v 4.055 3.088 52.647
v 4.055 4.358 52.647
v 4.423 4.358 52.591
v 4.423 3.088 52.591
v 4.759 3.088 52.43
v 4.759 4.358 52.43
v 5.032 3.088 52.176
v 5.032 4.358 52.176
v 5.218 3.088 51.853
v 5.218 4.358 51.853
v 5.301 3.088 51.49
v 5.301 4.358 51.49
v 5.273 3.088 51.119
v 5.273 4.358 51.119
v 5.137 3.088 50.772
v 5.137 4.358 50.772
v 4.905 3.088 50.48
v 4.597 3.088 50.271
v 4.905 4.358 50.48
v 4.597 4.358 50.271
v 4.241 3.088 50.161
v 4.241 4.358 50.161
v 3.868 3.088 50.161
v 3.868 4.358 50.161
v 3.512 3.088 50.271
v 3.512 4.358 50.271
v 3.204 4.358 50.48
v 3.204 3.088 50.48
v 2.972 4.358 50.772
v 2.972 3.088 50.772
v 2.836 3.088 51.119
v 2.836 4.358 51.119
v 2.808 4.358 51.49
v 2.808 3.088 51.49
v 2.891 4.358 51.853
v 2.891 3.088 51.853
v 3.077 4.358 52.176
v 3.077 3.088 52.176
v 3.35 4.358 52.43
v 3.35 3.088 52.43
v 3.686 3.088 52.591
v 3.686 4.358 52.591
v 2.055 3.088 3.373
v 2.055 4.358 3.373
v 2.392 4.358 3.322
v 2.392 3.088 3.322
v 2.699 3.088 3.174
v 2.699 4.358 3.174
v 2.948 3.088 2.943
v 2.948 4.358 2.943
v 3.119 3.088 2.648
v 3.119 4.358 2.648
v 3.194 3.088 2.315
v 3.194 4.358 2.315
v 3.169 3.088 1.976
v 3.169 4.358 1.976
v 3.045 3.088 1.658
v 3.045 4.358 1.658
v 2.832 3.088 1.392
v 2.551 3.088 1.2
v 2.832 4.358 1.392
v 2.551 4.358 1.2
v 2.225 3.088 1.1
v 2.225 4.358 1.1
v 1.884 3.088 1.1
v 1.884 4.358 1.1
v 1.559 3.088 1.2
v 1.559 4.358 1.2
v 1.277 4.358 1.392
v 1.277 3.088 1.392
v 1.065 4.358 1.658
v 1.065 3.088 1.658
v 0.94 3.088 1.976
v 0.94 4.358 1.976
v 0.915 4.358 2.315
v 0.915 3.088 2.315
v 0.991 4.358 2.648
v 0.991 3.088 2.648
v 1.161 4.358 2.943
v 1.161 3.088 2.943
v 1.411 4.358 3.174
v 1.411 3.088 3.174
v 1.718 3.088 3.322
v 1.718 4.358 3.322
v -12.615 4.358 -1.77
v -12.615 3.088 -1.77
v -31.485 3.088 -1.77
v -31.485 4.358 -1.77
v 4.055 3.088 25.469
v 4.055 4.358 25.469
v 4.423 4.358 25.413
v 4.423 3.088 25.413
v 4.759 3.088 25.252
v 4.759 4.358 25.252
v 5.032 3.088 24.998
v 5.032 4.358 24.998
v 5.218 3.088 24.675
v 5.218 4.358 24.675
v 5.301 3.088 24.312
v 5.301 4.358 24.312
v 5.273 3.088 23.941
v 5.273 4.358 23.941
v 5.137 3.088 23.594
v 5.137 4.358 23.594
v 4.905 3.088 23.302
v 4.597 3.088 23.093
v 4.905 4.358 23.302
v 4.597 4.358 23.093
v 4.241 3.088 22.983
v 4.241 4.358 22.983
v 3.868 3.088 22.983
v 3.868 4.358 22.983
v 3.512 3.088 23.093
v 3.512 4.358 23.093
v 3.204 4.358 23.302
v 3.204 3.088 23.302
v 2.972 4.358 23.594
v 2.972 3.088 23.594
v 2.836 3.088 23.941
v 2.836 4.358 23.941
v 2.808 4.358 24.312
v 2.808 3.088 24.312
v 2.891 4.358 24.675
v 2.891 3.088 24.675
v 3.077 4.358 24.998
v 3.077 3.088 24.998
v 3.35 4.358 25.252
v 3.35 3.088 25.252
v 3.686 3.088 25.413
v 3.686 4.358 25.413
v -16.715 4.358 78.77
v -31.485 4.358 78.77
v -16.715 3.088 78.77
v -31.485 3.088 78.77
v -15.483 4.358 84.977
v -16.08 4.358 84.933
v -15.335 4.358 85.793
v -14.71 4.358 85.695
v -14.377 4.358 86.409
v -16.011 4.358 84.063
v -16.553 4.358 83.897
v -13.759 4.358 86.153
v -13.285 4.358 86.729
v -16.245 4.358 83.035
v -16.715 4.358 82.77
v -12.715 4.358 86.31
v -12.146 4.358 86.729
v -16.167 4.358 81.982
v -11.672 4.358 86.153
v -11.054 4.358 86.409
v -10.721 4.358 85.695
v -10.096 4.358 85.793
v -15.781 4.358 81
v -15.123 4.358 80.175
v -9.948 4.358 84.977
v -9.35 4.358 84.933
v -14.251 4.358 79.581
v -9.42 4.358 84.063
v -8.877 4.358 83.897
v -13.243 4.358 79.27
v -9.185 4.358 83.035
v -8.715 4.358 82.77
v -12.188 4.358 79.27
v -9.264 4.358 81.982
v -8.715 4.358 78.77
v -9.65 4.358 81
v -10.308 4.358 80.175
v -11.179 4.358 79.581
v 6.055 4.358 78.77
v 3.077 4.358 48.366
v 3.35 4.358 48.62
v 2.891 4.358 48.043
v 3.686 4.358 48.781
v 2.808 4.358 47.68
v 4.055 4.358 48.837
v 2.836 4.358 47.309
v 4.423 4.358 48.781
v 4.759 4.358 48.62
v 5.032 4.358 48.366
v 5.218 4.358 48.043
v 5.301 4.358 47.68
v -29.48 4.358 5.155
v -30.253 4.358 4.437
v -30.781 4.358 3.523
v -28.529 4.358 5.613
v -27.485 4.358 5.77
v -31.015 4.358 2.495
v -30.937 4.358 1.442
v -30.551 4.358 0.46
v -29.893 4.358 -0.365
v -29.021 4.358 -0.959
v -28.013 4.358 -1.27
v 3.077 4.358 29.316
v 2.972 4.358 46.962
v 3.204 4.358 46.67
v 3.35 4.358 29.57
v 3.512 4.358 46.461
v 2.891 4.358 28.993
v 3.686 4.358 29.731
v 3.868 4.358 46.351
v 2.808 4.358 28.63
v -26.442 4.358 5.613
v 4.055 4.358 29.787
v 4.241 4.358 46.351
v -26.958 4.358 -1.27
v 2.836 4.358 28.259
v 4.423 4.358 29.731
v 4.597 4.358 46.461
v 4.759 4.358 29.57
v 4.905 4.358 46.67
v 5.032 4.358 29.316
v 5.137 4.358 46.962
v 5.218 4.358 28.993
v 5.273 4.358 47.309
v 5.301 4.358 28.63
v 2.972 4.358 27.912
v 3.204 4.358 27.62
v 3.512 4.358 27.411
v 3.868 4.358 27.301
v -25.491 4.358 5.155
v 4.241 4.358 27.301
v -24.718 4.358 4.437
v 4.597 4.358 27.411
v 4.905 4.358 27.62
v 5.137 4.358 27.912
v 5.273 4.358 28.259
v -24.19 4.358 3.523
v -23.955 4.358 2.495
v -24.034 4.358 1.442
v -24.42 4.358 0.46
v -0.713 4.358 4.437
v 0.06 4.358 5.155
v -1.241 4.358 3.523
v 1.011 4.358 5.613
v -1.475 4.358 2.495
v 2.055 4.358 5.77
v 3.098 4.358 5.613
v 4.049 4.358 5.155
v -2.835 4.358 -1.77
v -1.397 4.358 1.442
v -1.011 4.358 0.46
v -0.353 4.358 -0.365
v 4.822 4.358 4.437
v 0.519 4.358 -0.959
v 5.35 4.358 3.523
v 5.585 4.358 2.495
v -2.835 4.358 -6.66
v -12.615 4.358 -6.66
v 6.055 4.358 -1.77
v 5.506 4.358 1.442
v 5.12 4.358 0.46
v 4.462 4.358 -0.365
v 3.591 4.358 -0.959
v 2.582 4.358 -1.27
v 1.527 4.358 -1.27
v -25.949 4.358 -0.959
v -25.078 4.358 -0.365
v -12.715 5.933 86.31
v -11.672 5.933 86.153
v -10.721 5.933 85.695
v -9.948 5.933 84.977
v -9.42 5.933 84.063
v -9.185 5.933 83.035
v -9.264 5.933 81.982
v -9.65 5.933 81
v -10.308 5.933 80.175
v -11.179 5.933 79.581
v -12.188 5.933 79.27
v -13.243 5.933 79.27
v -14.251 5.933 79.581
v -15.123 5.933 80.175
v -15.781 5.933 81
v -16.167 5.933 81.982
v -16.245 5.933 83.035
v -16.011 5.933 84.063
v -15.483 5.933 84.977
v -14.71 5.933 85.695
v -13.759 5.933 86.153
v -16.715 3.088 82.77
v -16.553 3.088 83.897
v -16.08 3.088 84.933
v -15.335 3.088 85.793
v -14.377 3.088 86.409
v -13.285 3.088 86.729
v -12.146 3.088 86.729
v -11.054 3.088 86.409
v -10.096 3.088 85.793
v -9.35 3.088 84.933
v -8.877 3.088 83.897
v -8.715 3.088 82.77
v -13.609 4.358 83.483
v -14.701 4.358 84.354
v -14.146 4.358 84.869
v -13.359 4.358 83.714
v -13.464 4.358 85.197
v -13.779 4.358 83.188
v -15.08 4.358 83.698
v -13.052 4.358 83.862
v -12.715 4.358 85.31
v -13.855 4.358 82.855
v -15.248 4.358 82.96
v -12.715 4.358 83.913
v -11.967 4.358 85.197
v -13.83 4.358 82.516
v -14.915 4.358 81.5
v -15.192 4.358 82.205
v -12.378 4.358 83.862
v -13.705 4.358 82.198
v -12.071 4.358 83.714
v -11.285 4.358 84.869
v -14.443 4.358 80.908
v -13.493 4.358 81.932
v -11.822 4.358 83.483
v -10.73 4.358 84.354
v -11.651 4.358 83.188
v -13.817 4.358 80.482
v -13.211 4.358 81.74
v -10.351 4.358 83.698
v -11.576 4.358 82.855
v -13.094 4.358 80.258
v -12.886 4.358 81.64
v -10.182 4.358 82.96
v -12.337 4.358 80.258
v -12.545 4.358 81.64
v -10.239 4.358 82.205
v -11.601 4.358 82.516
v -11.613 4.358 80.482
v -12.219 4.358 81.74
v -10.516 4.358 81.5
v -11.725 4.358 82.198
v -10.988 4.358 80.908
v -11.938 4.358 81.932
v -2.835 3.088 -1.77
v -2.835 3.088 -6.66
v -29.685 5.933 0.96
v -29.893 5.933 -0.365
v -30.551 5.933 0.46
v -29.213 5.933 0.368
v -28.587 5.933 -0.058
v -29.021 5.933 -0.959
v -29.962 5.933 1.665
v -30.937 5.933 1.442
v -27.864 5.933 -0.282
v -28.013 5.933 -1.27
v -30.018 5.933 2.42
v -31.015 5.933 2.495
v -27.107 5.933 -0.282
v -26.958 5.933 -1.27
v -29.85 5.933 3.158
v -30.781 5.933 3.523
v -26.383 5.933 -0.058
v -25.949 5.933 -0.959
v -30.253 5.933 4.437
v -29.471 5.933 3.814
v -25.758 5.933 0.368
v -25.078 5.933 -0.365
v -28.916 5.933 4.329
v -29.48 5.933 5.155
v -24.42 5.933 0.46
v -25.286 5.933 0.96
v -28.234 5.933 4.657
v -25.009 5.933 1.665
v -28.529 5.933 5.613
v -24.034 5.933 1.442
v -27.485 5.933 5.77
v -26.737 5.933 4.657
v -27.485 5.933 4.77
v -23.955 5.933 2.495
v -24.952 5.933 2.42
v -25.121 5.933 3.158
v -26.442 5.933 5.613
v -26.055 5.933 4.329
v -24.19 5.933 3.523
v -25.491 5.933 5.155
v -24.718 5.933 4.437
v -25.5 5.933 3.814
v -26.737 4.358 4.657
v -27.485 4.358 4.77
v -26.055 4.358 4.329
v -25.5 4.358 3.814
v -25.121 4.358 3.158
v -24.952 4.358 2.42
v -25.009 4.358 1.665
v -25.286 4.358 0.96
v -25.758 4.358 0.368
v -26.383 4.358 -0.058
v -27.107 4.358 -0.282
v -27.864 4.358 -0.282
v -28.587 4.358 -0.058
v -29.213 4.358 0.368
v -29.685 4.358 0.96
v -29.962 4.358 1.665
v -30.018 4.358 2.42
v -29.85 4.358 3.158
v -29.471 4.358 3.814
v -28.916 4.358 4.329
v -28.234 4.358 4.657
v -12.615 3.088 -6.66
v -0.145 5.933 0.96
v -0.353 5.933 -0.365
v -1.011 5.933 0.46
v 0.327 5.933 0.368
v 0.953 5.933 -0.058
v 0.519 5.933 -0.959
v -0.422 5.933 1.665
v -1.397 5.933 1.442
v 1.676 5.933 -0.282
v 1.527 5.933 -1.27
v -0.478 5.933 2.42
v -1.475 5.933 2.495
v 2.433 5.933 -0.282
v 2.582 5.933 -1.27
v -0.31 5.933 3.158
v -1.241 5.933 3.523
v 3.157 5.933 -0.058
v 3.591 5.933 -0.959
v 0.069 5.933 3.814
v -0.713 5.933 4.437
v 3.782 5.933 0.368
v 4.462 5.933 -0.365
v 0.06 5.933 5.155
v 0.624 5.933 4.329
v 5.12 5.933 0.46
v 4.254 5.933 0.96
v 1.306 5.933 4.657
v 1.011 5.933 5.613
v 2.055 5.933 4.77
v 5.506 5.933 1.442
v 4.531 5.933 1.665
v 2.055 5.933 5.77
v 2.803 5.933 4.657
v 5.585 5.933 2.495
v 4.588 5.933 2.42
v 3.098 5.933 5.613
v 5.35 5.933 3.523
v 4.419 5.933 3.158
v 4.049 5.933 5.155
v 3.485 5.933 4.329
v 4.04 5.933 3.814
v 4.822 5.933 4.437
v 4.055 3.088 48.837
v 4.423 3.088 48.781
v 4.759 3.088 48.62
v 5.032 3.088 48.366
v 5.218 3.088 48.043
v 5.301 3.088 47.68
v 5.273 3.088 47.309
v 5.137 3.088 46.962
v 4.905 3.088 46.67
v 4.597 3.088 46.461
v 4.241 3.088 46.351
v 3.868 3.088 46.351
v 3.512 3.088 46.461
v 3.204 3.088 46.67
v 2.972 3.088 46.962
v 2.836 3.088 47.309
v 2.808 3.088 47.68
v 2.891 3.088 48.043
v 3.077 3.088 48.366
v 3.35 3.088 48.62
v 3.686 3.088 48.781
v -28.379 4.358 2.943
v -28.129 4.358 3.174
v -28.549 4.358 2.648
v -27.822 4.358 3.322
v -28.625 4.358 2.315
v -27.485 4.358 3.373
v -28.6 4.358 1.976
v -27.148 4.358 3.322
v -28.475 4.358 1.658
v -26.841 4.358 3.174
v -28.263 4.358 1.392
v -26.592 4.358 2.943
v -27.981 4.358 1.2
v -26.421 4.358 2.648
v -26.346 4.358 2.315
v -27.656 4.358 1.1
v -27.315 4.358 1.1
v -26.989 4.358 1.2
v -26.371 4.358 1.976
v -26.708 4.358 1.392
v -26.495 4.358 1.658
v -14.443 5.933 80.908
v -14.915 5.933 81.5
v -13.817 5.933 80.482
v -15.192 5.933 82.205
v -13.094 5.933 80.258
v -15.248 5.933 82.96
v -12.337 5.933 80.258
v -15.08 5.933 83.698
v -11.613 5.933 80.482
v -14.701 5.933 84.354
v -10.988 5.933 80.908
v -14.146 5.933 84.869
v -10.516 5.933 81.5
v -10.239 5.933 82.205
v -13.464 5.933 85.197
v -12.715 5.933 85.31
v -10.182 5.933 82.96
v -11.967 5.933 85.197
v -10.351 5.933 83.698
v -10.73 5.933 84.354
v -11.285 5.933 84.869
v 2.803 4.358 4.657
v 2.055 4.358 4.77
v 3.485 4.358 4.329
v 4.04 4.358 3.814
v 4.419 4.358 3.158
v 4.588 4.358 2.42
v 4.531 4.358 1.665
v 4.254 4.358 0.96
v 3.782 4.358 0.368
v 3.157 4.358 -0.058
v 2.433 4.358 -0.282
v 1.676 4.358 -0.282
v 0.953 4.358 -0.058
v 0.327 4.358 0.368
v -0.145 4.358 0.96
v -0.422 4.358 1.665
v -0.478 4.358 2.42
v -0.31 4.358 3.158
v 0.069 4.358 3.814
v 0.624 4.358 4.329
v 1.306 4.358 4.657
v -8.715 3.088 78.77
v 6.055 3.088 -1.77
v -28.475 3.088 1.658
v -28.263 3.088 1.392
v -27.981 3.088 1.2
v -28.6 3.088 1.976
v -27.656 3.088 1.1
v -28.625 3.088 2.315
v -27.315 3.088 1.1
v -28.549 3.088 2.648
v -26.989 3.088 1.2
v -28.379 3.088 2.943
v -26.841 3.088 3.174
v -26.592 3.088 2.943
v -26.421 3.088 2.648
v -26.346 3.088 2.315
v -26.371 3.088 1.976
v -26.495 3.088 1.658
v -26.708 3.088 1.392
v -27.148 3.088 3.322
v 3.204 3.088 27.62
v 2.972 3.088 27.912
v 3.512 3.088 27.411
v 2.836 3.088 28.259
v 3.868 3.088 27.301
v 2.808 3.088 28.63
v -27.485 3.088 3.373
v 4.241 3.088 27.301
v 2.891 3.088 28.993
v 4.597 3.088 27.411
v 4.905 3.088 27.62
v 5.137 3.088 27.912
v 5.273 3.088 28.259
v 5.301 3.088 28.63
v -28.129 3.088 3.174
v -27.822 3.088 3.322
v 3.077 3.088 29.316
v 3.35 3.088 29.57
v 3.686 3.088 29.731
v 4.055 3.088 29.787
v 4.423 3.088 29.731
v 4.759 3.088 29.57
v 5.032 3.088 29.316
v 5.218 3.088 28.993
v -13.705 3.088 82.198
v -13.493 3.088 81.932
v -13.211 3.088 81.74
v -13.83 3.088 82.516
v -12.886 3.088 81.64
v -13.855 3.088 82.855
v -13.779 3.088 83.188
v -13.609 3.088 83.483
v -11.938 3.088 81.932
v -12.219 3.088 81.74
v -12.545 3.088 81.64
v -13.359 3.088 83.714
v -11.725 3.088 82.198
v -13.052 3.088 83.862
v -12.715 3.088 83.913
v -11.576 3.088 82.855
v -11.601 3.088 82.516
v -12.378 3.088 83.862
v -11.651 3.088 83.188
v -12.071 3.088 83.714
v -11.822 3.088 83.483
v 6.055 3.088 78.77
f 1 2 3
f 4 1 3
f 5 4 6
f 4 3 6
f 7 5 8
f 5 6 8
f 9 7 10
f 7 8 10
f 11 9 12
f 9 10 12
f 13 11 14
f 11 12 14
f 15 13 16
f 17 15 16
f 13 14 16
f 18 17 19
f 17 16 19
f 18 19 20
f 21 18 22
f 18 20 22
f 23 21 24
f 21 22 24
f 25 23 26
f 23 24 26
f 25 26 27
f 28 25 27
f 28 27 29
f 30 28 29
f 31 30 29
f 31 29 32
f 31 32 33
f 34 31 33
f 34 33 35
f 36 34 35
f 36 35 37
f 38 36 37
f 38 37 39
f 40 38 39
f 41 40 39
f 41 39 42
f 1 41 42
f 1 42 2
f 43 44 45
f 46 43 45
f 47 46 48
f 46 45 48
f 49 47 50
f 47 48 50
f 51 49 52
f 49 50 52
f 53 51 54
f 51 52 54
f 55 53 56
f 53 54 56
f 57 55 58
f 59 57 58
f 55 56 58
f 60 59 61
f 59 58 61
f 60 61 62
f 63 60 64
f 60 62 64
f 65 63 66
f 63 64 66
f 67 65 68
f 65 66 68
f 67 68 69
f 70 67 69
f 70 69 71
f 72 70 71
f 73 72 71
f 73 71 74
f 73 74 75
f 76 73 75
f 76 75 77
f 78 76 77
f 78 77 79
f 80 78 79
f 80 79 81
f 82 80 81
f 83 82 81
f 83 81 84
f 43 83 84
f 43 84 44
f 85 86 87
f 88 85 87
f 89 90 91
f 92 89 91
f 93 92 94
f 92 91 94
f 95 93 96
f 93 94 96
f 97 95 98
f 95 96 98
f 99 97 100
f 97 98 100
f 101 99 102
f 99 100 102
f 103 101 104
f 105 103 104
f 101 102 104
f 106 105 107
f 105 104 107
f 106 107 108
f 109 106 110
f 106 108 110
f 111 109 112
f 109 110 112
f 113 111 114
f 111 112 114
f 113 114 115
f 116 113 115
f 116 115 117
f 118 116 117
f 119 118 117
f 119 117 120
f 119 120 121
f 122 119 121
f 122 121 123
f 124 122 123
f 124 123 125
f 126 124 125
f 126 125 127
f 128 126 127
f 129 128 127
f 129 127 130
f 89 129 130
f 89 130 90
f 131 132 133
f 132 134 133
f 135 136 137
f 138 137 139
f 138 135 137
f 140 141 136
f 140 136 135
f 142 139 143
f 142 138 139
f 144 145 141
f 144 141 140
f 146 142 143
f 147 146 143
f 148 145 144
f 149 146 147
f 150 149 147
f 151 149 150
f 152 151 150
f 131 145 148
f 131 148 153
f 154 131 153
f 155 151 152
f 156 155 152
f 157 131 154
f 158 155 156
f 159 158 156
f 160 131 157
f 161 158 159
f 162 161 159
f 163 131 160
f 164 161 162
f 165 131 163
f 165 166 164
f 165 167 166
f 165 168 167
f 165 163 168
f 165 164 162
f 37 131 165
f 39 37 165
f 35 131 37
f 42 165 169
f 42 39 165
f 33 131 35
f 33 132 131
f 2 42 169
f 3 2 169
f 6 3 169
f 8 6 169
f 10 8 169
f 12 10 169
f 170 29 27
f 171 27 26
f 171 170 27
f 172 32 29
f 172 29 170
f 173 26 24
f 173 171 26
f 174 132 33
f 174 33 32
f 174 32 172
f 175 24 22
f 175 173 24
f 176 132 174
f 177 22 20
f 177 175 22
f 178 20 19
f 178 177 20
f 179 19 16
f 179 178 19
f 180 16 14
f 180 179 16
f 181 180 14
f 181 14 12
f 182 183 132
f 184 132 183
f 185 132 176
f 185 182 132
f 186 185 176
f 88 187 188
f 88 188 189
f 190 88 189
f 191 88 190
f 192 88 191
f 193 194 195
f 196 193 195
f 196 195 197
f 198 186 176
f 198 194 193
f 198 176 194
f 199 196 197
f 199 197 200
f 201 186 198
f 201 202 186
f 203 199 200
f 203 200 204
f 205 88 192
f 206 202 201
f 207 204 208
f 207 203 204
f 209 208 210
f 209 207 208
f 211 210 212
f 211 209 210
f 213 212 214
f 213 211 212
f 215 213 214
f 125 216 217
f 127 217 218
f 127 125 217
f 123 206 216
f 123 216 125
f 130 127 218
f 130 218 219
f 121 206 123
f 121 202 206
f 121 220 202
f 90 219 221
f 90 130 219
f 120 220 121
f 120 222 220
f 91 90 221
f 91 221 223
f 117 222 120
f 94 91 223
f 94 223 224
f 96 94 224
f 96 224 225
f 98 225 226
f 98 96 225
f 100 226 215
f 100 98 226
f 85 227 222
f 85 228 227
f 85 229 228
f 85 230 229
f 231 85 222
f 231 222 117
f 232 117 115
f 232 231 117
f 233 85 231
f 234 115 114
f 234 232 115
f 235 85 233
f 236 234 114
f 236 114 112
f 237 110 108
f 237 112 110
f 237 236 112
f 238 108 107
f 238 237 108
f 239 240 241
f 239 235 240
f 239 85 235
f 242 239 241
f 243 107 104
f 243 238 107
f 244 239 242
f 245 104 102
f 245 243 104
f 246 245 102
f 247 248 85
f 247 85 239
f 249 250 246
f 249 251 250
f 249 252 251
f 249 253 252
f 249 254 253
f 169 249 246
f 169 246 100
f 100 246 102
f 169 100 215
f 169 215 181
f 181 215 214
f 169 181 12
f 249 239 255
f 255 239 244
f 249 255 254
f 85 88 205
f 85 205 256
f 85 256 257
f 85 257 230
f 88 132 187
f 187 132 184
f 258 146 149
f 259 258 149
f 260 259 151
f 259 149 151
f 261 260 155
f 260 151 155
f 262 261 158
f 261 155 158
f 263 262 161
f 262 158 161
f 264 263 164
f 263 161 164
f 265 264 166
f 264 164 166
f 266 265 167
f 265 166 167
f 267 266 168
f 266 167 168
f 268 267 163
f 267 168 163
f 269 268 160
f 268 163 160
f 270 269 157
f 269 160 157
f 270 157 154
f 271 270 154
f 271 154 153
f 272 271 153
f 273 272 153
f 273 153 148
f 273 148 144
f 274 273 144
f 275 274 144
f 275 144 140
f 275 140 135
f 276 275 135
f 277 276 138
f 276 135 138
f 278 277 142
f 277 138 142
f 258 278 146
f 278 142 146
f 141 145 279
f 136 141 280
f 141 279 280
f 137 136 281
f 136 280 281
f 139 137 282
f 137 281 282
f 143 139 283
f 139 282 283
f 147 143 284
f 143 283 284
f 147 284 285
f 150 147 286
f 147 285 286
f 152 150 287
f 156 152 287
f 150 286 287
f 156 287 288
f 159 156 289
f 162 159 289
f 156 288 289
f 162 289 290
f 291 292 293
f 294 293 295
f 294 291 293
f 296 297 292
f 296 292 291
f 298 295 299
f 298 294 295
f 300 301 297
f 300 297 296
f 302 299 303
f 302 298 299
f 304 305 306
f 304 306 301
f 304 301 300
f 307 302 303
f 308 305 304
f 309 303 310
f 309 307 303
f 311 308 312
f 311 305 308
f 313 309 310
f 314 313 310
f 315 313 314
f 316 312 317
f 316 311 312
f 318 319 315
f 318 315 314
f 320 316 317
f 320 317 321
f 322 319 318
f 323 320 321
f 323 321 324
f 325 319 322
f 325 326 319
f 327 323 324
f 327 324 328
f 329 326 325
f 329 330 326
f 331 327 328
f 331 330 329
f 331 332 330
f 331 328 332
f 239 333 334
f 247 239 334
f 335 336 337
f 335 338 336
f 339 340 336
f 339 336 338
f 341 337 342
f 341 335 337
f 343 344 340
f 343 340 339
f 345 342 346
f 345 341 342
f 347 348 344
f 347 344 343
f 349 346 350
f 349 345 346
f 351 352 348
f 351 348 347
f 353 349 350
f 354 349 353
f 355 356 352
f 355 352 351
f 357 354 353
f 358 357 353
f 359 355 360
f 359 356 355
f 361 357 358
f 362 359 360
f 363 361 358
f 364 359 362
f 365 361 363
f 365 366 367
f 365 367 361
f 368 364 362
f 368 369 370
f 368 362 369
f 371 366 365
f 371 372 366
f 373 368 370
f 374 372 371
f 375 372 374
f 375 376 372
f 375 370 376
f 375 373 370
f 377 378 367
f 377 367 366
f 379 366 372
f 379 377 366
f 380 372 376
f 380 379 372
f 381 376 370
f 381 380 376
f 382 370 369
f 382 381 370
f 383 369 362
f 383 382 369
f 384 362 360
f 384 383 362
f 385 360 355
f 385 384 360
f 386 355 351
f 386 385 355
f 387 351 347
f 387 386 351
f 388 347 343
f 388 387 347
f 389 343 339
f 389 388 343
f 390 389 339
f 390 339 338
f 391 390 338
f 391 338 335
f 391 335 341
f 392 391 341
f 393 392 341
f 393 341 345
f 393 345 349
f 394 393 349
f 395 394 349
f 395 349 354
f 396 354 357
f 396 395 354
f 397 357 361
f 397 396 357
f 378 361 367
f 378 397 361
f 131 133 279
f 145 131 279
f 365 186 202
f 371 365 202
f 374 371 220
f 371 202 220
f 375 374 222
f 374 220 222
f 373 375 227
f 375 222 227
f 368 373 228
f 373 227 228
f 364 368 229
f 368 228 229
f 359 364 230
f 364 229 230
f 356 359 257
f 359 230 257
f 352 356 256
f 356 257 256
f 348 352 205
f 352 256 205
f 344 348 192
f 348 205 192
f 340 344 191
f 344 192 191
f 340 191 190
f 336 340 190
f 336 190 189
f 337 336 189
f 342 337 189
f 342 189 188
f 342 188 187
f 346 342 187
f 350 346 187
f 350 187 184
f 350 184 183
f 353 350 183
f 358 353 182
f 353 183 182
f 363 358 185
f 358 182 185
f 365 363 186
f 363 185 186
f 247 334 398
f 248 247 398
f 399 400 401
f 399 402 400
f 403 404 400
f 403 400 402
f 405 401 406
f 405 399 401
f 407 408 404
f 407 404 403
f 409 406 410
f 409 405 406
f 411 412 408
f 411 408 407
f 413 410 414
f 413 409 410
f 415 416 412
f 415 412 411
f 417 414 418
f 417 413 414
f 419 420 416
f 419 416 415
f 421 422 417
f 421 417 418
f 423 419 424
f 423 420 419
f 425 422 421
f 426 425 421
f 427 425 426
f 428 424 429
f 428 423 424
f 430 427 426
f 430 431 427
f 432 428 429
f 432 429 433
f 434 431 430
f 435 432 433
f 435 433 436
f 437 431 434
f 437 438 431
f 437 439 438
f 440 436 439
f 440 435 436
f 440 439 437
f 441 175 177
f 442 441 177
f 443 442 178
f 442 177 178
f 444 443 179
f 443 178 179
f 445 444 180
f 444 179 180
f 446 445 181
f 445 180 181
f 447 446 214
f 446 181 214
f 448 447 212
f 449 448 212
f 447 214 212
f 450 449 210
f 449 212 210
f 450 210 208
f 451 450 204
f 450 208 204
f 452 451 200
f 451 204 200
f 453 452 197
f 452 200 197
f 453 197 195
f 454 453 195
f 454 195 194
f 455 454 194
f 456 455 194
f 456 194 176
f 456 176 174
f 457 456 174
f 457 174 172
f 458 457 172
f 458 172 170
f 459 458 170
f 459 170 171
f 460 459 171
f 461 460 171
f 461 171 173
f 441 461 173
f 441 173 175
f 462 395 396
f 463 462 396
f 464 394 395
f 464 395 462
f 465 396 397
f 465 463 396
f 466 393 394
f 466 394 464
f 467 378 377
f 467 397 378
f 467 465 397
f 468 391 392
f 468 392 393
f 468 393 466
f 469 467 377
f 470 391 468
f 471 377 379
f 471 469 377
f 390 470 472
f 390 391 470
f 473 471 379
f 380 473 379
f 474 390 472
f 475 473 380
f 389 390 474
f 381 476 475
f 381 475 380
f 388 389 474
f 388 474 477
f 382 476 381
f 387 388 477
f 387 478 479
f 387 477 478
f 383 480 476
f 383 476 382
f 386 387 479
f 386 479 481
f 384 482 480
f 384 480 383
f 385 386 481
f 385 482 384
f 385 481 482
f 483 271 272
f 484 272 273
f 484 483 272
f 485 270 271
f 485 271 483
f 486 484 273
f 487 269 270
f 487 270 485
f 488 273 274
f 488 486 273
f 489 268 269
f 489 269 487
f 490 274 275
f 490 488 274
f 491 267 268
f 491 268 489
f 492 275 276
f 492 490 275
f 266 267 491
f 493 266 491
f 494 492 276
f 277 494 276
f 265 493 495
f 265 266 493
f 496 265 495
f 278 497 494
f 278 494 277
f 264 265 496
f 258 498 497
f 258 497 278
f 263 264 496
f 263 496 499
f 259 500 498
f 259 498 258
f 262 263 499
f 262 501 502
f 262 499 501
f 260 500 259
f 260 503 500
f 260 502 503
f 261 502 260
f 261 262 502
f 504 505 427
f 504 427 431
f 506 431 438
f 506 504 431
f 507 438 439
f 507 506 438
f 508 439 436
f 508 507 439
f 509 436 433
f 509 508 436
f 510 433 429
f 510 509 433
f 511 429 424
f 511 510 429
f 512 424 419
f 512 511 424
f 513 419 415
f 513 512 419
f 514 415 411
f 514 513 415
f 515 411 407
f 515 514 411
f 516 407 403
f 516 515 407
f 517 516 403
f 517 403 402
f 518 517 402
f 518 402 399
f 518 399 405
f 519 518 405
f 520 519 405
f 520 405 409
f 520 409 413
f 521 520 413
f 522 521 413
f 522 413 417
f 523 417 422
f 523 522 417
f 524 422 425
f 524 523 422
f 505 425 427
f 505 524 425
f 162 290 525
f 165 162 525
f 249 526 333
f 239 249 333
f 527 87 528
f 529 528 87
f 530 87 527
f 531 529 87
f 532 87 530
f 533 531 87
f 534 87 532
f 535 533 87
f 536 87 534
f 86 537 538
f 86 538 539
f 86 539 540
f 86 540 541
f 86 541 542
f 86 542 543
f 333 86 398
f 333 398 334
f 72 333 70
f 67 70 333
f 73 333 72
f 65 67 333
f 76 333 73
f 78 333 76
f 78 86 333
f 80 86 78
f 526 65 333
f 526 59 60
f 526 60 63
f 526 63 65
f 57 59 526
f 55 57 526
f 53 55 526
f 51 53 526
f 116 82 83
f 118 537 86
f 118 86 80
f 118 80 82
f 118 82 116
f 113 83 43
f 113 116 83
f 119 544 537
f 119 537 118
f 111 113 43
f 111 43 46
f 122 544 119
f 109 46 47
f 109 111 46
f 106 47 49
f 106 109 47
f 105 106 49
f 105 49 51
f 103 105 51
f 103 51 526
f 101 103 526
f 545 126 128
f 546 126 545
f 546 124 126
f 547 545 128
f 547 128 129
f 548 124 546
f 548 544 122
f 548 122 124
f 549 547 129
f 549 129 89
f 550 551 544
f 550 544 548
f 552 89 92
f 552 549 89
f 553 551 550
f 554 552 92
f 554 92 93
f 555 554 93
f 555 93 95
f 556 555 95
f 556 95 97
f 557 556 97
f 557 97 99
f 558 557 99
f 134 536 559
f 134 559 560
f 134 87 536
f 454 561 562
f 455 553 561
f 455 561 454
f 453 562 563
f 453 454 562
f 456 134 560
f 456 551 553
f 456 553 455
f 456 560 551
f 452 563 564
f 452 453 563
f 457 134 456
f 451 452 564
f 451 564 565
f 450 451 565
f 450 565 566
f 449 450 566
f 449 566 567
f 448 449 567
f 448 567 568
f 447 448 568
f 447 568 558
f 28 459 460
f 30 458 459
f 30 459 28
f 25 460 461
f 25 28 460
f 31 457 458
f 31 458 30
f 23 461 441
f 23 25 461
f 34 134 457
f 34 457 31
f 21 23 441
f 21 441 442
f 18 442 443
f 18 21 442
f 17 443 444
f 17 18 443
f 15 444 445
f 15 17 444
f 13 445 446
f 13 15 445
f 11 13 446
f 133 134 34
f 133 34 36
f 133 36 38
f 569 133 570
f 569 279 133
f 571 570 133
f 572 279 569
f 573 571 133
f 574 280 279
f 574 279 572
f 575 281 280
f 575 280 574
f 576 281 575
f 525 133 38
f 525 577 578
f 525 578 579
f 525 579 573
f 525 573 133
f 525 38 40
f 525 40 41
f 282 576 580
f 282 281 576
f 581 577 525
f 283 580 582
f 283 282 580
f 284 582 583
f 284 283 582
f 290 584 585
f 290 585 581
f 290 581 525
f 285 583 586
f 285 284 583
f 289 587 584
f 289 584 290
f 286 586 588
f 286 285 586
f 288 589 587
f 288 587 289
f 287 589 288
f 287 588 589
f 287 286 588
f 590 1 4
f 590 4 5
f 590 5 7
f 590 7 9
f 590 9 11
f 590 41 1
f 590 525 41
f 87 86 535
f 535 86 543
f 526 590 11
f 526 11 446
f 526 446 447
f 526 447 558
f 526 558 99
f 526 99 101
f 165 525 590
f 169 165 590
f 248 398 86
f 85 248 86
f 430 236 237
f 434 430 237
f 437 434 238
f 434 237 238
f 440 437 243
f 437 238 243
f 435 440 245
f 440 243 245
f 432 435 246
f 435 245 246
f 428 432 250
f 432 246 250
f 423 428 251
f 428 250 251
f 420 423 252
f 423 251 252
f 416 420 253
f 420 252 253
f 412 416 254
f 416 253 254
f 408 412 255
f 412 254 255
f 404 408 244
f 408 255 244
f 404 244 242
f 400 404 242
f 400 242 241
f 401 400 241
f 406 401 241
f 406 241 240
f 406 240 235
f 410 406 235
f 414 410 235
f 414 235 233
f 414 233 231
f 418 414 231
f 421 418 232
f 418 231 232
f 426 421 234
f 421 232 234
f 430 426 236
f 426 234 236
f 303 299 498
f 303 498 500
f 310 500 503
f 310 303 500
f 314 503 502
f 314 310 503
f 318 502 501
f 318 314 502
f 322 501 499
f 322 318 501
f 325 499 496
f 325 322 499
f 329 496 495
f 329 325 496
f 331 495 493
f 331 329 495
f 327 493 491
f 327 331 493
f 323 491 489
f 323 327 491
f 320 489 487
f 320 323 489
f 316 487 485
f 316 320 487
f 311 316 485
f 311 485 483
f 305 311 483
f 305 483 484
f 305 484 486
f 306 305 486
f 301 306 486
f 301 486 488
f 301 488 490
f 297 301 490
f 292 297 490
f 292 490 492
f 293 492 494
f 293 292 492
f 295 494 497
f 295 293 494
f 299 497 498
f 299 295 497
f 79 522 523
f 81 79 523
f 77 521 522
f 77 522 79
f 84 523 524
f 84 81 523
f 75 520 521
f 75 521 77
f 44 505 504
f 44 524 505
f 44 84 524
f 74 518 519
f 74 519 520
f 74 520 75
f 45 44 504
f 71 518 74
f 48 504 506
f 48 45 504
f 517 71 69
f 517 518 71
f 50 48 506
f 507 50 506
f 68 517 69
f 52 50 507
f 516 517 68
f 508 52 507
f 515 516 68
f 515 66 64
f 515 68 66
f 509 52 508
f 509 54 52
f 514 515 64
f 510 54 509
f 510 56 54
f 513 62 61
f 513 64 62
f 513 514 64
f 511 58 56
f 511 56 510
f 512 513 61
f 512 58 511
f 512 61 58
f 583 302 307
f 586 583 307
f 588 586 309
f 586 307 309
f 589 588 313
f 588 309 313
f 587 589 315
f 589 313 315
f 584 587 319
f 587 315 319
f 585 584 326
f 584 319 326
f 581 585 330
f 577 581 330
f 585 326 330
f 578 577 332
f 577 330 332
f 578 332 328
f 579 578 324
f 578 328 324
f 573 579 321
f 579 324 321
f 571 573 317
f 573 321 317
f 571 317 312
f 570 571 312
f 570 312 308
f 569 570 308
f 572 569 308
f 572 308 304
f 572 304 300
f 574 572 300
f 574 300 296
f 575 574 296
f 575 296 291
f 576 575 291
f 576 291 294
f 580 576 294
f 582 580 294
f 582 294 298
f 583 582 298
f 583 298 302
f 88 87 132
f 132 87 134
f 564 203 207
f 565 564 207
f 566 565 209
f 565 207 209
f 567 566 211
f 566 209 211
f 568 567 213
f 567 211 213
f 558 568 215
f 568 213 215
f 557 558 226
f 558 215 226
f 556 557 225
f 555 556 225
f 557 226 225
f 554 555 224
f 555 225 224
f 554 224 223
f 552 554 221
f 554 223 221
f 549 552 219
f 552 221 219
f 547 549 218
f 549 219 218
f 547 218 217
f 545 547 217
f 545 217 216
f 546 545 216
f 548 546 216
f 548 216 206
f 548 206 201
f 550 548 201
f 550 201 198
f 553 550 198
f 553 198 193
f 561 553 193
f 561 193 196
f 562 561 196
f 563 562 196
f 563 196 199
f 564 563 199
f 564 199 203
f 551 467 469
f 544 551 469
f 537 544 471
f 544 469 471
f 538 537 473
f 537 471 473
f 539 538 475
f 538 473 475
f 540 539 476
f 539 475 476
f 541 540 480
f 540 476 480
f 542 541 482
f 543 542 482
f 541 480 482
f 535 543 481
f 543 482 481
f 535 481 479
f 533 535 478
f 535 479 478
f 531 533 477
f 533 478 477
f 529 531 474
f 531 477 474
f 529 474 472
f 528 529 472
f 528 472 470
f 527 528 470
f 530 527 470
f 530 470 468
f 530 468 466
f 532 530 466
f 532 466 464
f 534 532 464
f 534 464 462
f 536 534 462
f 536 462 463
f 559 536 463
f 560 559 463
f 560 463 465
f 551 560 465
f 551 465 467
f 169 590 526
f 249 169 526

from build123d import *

# Parameters (mm, degrees)
BOSS_EXTRUDE1_DEPTH                  = 77
SKETCH3_W                            = 37.54
SKETCH3_H                            = 17.27
BOSS_EXTRUDE2_DEPTH                  = 1.77
SKETCH4_W                            = 37.54
SKETCH4_H                            = 17.27
BOSS_EXTRUDE3_DEPTH                  = 1.77
SKETCH5_W                            = 4
SKETCH5_H                            = 16
CUT_EXTRUDE2_DEPTH                   = 1.77
SKETCH6_W                            = 9.78
SKETCH6_H                            = 11.05
SKETCH6_W_2                          = 7.24
SKETCH6_H_2                          = 7.24
BUTTON_WALLS_DEPTH                   = 7.24
SKETCH7_W                            = 9.78
SKETCH7_H                            = 11.05
BUTTON_BOTTOM_DEPTH                  = 1.27
SKETCH8_W                            = 7.24
SKETCH8_H                            = 1.77
BUTTON_CUTOUT_MIDDLE_DEPTH           = 7.24
SKETCH9_W                            = 4.45
SKETCH9_H                            = 1.27
SKETCH9_W_2                          = 3.37
SKETCH9_H_2                          = 4.39
BUTTON_CUTOUT_FRONT_BACK_DEPTH       = 7.24
SKETCH10_W                           = 3.37
SKETCH10_H                           = 4.39
BUTTON_CUTOUT_BOTTOM_DEPTH           = 1.27
BUTTON_CHAMFER1_SIZE                 = 5
SKETCH12_W                           = 35
SKETCH12_H                           = 1.77
SKETCH12_W_2                         = 1.77
SKETCH12_H_2                         = 10
SKETCH12_W_3                         = 7.5
SKETCH12_R                           = 0.9652
SKETCH12_H_3                         = 7
SUPPORT_PCB_BATTERY_DEPTH            = 7
SKETCH13_R                           = 1.25
SKETCH13_W                           = 8.8
SKETCH13_H                           = 4.8
CUTOUT_USB_3_LEDS_DEPTH              = 1.77
SKETCH16_W                           = 1.77
SKETCH16_H                           = 1.77
TAB_PCB_RETAINER_LEN_DEPTH           = 3
SKETCH17_W                           = 4
SKETCH17_H                           = 1.77
CUTOUT_BACK_MOT_WIRES_DEPTH          = 9
SKETCH18_R                           = 1.25
CUTOUT_CHG_DONE_LED_DEPTH            = 10
SKETCH19_W                           = 4.2
SKETCH19_H                           = 1.77
TAB_PCB_RETAINERS_WIDTH_DEPTH        = 10
CUTOUT_RETAINER_TAB_1_DEPTH          = 1.77
CUTOUT_RETAINER_TAB_2_DEPTH          = 1.77
SKETCH23_W                           = 8
SKETCH23_H                           = 8
SKETCH23_R                           = 0.9652
CASING_SCREW_POSTS_DEPTH             = 17.27
SKETCH24_R                           = 0.9652
EXTRUDE_LID_DEPTH                    = 1.27
SKETCH25_W                           = 118.370576462
SKETCH25_H                           = 160.815259781
REMOVE_BOX_MATERIAL_DEPTH            = 17.27
SKETCH26_R                           = 1.143
THRU_HOLE_NO2_THREAD_96001A164_DEPTH = 10
SKETCH27_R                           = 3.54
SKETCH27_R_2                         = 2.54
SCREW_HEAD_RECESS_DEPTH              = 1.5748
SKETCH28_R                           = 1.25
CUTOUT_LEDS_DEPTH                    = 10


with BuildPart() as part:
    # Sketch2 → Boss-Extrude1 (new body)
    with BuildSketch(Plane.XY):
        Polygon((-30.215355805, 3.088014981), (-30.215355805, -12.911985019), (4.784644195, -12.911985019), (4.784644195, 3.088014981), (6.054644195, 3.088014981), (6.054644195, -14.181985019), (-31.485355805, -14.181985019), (-31.485355805, 3.088014981), align=None)
    extrude(amount=BOSS_EXTRUDE1_DEPTH)

    # Sketch3 → Boss-Extrude2 (add)
    with BuildSketch(Plane.XY.offset(77)):
        with Locations((-12.715355805, -5.546985019)):
            Rectangle(SKETCH3_W, SKETCH3_H)
    extrude(amount=BOSS_EXTRUDE2_DEPTH)

    # Sketch4 → Boss-Extrude3 (add)
    with BuildSketch(Plane(origin=(0, 0, 0), x_dir=(-1, 0, 0), z_dir=(0, 0, -1))):
        with Locations((12.715355805, -5.546985019)):
            Rectangle(SKETCH4_W, SKETCH4_H)
    extrude(amount=BOSS_EXTRUDE3_DEPTH)

    # Sketch5 → Cut-Extrude2 (cut)
    with BuildSketch(Plane(origin=(0, 0, -1.77), x_dir=(-1, 0, 0), z_dir=(0, 0, -1))):
        with Locations((19.215355805, -4.911985019)):
            Rectangle(SKETCH5_W, SKETCH5_H)
    extrude(amount=-CUT_EXTRUDE2_DEPTH, mode=Mode.SUBTRACT)

    # Sketch6 → button_walls (add)
    with BuildSketch(Plane(origin=(0, 3.088014981, 0), x_dir=(1, 0, 0), z_dir=(0, 1, 0))):
        with Locations((-7.725355805, 1.135)):
            Rectangle(SKETCH6_W, SKETCH6_H)
        with Locations((-7.725355805, 1.77)):
            Rectangle(SKETCH6_W_2, SKETCH6_H_2, mode=Mode.SUBTRACT)
    extrude(amount=-BUTTON_WALLS_DEPTH)

    # Sketch7 → button_bottom (add)
    with BuildSketch(Plane.XZ.offset(4.151985019)):
        with Locations((-7.725355805, -1.135)):
            Rectangle(SKETCH7_W, SKETCH7_H)
    extrude(amount=BUTTON_BOTTOM_DEPTH)

    # Sketch8 → button_cutout_middle (cut)
    with BuildSketch(Plane(origin=(0, 3.088014981, 0), x_dir=(1, 0, 0), z_dir=(0, 1, 0))):
        with Locations((-7.725355805, 0.885)):
            Rectangle(SKETCH8_W, SKETCH8_H)
    extrude(amount=-BUTTON_CUTOUT_MIDDLE_DEPTH, mode=Mode.SUBTRACT)

    # Sketch9 → button_cutout_front_back (cut)
    with BuildSketch(Plane(origin=(0, 3.088014981, 0), x_dir=(1, 0, 0), z_dir=(0, 1, 0))):
        with Locations((-7.720355805, 6.025)):
            Rectangle(SKETCH9_W, SKETCH9_H)
        with Locations((-10.930355805, -2.195)):
            Rectangle(SKETCH9_W_2, SKETCH9_H_2)
        with Locations((-4.520355805, -2.195)):
            Rectangle(SKETCH9_W_2, SKETCH9_H_2)
    extrude(amount=-BUTTON_CUTOUT_FRONT_BACK_DEPTH, mode=Mode.SUBTRACT)

    # Sketch10 → button_cutout_bottom (cut)
    with BuildSketch(Plane(origin=(0, -4.151985019, 0), x_dir=(1, 0, 0), z_dir=(0, 1, 0))):
        with Locations((-10.930355805, -2.195)):
            Rectangle(SKETCH10_W, SKETCH10_H)
        with Locations((-4.520355805, -2.195)):
            Rectangle(SKETCH10_W, SKETCH10_H)
    extrude(amount=-BUTTON_CUTOUT_BOTTOM_DEPTH, mode=Mode.SUBTRACT)

    # button_Chamfer1
    # the kernel refuses this chamfer: 5 mm, written as the material it adds along each edge
    with BuildSketch(Plane(origin=(-6.205355805, -5.421985019, 0), x_dir=(0, -0.9996219169112968, -0.027495876610586372), z_dir=(-1, 0, 0))) as button_chamfer1_piece_1_section:
        Polygon((BUTTON_CHAMFER1_SIZE * 0.999621916911, BUTTON_CHAMFER1_SIZE * 0.0274958766106), (-BUTTON_CHAMFER1_SIZE * 0.0274958766106, BUTTON_CHAMFER1_SIZE * 0.999621916911), (0, 0), align=None)
    button_chamfer1_piece_1 = extrude(amount=3.04, mode=Mode.PRIVATE)
    button_chamfer1_piece_1 = split(button_chamfer1_piece_1, bisect_by=Plane(origin=(-7.725355805, -7.110612501, 4.39), z_dir=(0, 0, -1)), keep=Keep.TOP, mode=Mode.PRIVATE)
    add(button_chamfer1_piece_1)

    # Sketch12 → support_pcb_battery (add)
    # profile 1 of 5: a face of its own
    with BuildSketch(Plane(origin=(0, -12.911985019, 0), x_dir=(1, 0, 0), z_dir=(0, 1, 0))):
        with Locations((-12.715355805, -76.115)):
            Rectangle(SKETCH12_W, SKETCH12_H)
    # profile 2 of 5: a face of its own
    with BuildSketch(Plane(origin=(0, -12.911985019, 0), x_dir=(1, 0, 0), z_dir=(0, 1, 0))):
        with Locations((-27.100355805, -60.23)):
            Rectangle(SKETCH12_W_2, SKETCH12_H_2)
    # profile 3 of 5: a face of its own
    with BuildSketch(Plane(origin=(0, -12.911985019, 0), x_dir=(1, 0, 0), z_dir=(0, 1, 0))):
        with Locations((1.034644195, -36.845)):
            Rectangle(SKETCH12_W_3, SKETCH12_H)
    # profile 4 of 5: a face of its own
    with BuildSketch(Plane(origin=(0, -12.911985019, 0), x_dir=(1, 0, 0), z_dir=(0, 1, 0))):
        with BuildLine():
            Line((-25.783918863, -37.73), (-19.764792747, -37.73))
            ThreePointArc((-19.764792747, -37.73), (-22.774355805, -30.7466), (-25.783918863, -37.73))
        make_face()
        with Locations(Location((-22.774355805, -34.8868, 0), (0, 0, 270))):
            Circle(SKETCH12_R, mode=Mode.SUBTRACT)
    # profile 5 of 5: a face of its own
    with BuildSketch(Plane(origin=(0, -12.911985019, 0), x_dir=(1, 0, 0), z_dir=(0, 1, 0))):
        with Locations((-12.100355805, -23.33)):
            Rectangle(SKETCH12_W_2, SKETCH12_H_3)
    extrude(amount=SUPPORT_PCB_BATTERY_DEPTH)

    # Sketch13 → cutout_usb_3_leds (cut)
    with BuildSketch(Plane(origin=(6.054644195, 0, 0), x_dir=(0, 0, -1), z_dir=(1, 0, 0))):
        with Locations((-51.3968, -3.411985019)):
            Circle(SKETCH13_R)
        with Locations((-47.5868, -3.411985019)):
            Circle(SKETCH13_R)
        with Locations((-24.2188, -3.411985019)):
            Circle(SKETCH13_R)
        with Locations((-34.8868, -3.411985019)):
            Rectangle(SKETCH13_W, SKETCH13_H)
    extrude(amount=-CUTOUT_USB_3_LEDS_DEPTH, mode=Mode.SUBTRACT)

    # Sketch16 → tab_pcb_retainer_len (add)
    with BuildSketch(Plane(origin=(0, -5.911985019, 0), x_dir=(1, 0, 0), z_dir=(0, 1, 0))):
        with Locations((-12.100355805, -20.715)):
            Rectangle(SKETCH16_W, SKETCH16_H)
    extrude(amount=TAB_PCB_RETAINER_LEN_DEPTH)

    # Sketch17 → cutout_back_mot_wires (cut)
    with BuildSketch(Plane(origin=(0, 3.088014981, 0), x_dir=(1, 0, 0), z_dir=(0, 1, 0))):
        with Locations((-20.361355805, -77.885)):
            Rectangle(SKETCH17_W, SKETCH17_H)
    extrude(amount=-CUTOUT_BACK_MOT_WIRES_DEPTH, mode=Mode.SUBTRACT)

    # Sketch18 → cutout_chg_done_led (cut)
    with BuildSketch(Plane(origin=(6.054644195, 0, 0), x_dir=(0, 0, -1), z_dir=(1, 0, 0))):
        with Locations((-28.5368, -3.411985019)):
            Circle(SKETCH18_R)
    extrude(amount=-CUTOUT_CHG_DONE_LED_DEPTH, mode=Mode.SUBTRACT)

    # Sketch19 → tab_pcb_retainers_width (add)
    with BuildSketch(Plane(origin=(0, -12.911985019, 0), x_dir=(1, 0, 0), z_dir=(0, 1, 0))):
        with Locations((-28.115355805, -68.615)):
            Rectangle(SKETCH19_W, SKETCH19_H)
        with Locations((-28.115355805, -46.115)):
            Rectangle(SKETCH19_W, SKETCH19_H)
        with Locations((-28.115355805, -28.115)):
            Rectangle(SKETCH19_W, SKETCH19_H)
    extrude(amount=TAB_PCB_RETAINERS_WIDTH_DEPTH)

    # Sketch20 → cutout_retainer_tab_1 (cut)
    with BuildSketch(Plane.XY.offset(69.5)):
        Polygon((-26.015355805, -12.911985019), (-26.015355805, -5.911985019), (-28.445355805, -10.120868481), (-28.445355805, -12.911985019), align=None)
    extrude(amount=-CUTOUT_RETAINER_TAB_1_DEPTH, mode=Mode.SUBTRACT)

    # Sketch21 → cutout_retainer_tab_2 (cut)
    with BuildSketch(Plane.XY.offset(47)):
        Polygon((-26.015355805, -5.911985019), (-28.445355805, -10.120868481), (-28.445355805, -12.911985019), (-26.015355805, -12.911985019), align=None)
    extrude(amount=-CUTOUT_RETAINER_TAB_2_DEPTH, mode=Mode.SUBTRACT)

    # Sketch23 → casing_screw_posts (add)
    # profile 1 of 3: a face of its own
    with BuildSketch(Plane.XZ.offset(14.181985019)):
        with Locations((2.054644195, 2.23)):
            Rectangle(SKETCH23_W, SKETCH23_H)
        with Locations(Location((2.054644195, 2.23, 0), (0, 0, 270))):
            Circle(SKETCH23_R, mode=Mode.SUBTRACT)
    # profile 2 of 3: a face of its own
    with BuildSketch(Plane.XZ.offset(14.181985019)):
        with Locations((-27.485355805, 2.23)):
            Rectangle(SKETCH23_W, SKETCH23_H)
        with Locations(Location((-27.485355805, 2.23, 0), (0, 0, 270))):
            Circle(SKETCH23_R, mode=Mode.SUBTRACT)
    # profile 3 of 3: a face of its own
    with BuildSketch(Plane.XZ.offset(14.181985019)):
        with BuildLine():
            Line((-16.715355805, 82.77), (-16.715355805, 78.77))
            Line((-16.715355805, 78.77), (-8.715355805, 78.77))
            Line((-8.715355805, 78.77), (-8.715355805, 82.77))
            ThreePointArc((-8.715355805, 82.77), (-12.715355805, 86.77), (-16.715355805, 82.77))
        make_face()
        with Locations(Location((-12.715355805, 82.77, 0), (0, 0, 270))):
            Circle(SKETCH23_R, mode=Mode.SUBTRACT)
    extrude(amount=-CASING_SCREW_POSTS_DEPTH)

    # Sketch24 → extrude_lid (add)
    # profile 1 of 2: a face of its own
    with BuildSketch(Plane(origin=(0, 3.088014981, 0), x_dir=(1, 0, 0), z_dir=(0, 1, 0))):
        with BuildLine():
            Line((-8.715355805, -78.77), (6.054644195, -78.77))
            Line((6.054644195, -78.77), (6.054644195, 1.77))
            Line((6.054644195, 1.77), (-2.835355805, 1.77))
            Line((-2.835355805, 1.77), (-2.835355805, 6.66))
            Line((-2.835355805, 6.66), (-5.495355805, 6.66))
            Line((-5.495355805, 6.66), (-5.495355805, 5.39))
            Line((-5.495355805, 5.39), (-4.105355805, 5.39))
            Line((-4.105355805, 5.39), (-4.105355805, 0))
            Line((-4.105355805, 0), (-1.945355805, 0))
            Line((-1.945355805, 0), (-1.945355805, -6.23))
            Line((-1.945355805, -6.23), (4.784644195, -6.23))
            Line((4.784644195, -6.23), (4.784644195, -77))
            Line((4.784644195, -77), (-18.361355805, -77))
            Line((-18.361355805, -77), (-18.361355805, -78.77))
            Line((-18.361355805, -78.77), (-16.715355805, -78.77))
            Line((-16.715355805, -78.77), (-16.715355805, -82.77))
            ThreePointArc((-16.715355805, -82.77), (-12.715355805, -86.77), (-8.715355805, -82.77))
            Line((-8.715355805, -82.77), (-8.715355805, -78.77))
        make_face()
        with Locations(Location((-12.715355805, -82.77, 0), (0, 0, 90))):
            Circle(SKETCH24_R, mode=Mode.SUBTRACT)
        with Locations(Location((2.054644195, -2.23, 0), (0, 0, 90))):
            Circle(SKETCH24_R, mode=Mode.SUBTRACT)
    # profile 2 of 2: a face of its own
    with BuildSketch(Plane(origin=(0, 3.088014981, 0), x_dir=(1, 0, 0), z_dir=(0, 1, 0))):
        Polygon((-31.485355805, -78.77), (-18.361355805, -78.77), (-18.361355805, -77), (4.784644195, -77), (4.784644195, -6.23), (-1.945355805, -6.23), (-1.945355805, 0), (-4.105355805, 0), (-4.105355805, 5.39), (-5.495355805, 5.39), (-5.495355805, 6.66), (-12.615355805, 6.66), (-12.615355805, 1.77), (-31.485355805, 1.77), align=None)
        with Locations(Location((-27.485355805, -2.23, 0), (0, 0, 90))):
            Circle(SKETCH24_R, mode=Mode.SUBTRACT)
    extrude(amount=EXTRUDE_LID_DEPTH)

    # Sketch25 → remove_box_material (cut)
    with BuildSketch(Plane.XZ.offset(14.181985019)):
        with Locations((-13.638066312, 39.395921067)):
            Rectangle(SKETCH25_W, SKETCH25_H)
    extrude(amount=-REMOVE_BOX_MATERIAL_DEPTH, mode=Mode.SUBTRACT)

    # Sketch26 → thru_hole_no2_thread_96001A164 (cut)
    with BuildSketch(Plane(origin=(0, 4.358014981, 0), x_dir=(1, 0, 0), z_dir=(0, 1, 0))):
        with Locations(Location((-27.485355805, -2.23, 0), (0, 0, 270))):
            Circle(SKETCH26_R)
        with Locations(Location((2.054644195, -2.23, 0), (0, 0, 270))):
            Circle(SKETCH26_R)
        with Locations(Location((-12.715355805, -82.77, 0), (0, 0, 270))):
            Circle(SKETCH26_R)
    extrude(amount=-THRU_HOLE_NO2_THREAD_96001A164_DEPTH, mode=Mode.SUBTRACT)

    # Sketch27 → screw_head_recess (add)
    # profile 1 of 3: a face of its own
    with BuildSketch(Plane(origin=(0, 4.358014981, 0), x_dir=(1, 0, 0), z_dir=(0, 1, 0))):
        with Locations(Location((-12.715355805, -82.77, 0), (0, 0, 270))):
            Circle(SKETCH27_R)
        with Locations(Location((-12.715355805, -82.77, 0), (0, 0, 270))):
            Circle(SKETCH27_R_2, mode=Mode.SUBTRACT)
    # profile 2 of 3: a face of its own
    with BuildSketch(Plane(origin=(0, 4.358014981, 0), x_dir=(1, 0, 0), z_dir=(0, 1, 0))):
        with Locations(Location((-27.485355805, -2.23, 0), (0, 0, 270))):
            Circle(SKETCH27_R)
        with Locations(Location((-27.485355805, -2.23, 0), (0, 0, 270))):
            Circle(SKETCH27_R_2, mode=Mode.SUBTRACT)
    # profile 3 of 3: a face of its own
    with BuildSketch(Plane(origin=(0, 4.358014981, 0), x_dir=(1, 0, 0), z_dir=(0, 1, 0))):
        with Locations(Location((2.054644195, -2.23, 0), (0, 0, 270))):
            Circle(SKETCH27_R)
        with Locations(Location((2.054644195, -2.23, 0), (0, 0, 270))):
            Circle(SKETCH27_R_2, mode=Mode.SUBTRACT)
    extrude(amount=SCREW_HEAD_RECESS_DEPTH)

    # Sketch28 → cutout_leds (cut)
    with BuildSketch(Plane(origin=(0, 4.358014981, 0), x_dir=(1, 0, 0), z_dir=(0, 1, 0))):
        with Locations(Location((4.054644195, -51.3968, 0), (0, 0, 270))):
            Circle(SKETCH28_R)
        with Locations(Location((4.054644195, -47.5868, 0), (0, 0, 270))):
            Circle(SKETCH28_R)
        with Locations(Location((4.054644195, -28.5368, 0), (0, 0, 270))):
            Circle(SKETCH28_R)
        with Locations(Location((4.054644195, -24.2188, 0), (0, 0, 270))):
            Circle(SKETCH28_R)
    extrude(amount=-CUTOUT_LEDS_DEPTH, mode=Mode.SUBTRACT)


solid = part.part
